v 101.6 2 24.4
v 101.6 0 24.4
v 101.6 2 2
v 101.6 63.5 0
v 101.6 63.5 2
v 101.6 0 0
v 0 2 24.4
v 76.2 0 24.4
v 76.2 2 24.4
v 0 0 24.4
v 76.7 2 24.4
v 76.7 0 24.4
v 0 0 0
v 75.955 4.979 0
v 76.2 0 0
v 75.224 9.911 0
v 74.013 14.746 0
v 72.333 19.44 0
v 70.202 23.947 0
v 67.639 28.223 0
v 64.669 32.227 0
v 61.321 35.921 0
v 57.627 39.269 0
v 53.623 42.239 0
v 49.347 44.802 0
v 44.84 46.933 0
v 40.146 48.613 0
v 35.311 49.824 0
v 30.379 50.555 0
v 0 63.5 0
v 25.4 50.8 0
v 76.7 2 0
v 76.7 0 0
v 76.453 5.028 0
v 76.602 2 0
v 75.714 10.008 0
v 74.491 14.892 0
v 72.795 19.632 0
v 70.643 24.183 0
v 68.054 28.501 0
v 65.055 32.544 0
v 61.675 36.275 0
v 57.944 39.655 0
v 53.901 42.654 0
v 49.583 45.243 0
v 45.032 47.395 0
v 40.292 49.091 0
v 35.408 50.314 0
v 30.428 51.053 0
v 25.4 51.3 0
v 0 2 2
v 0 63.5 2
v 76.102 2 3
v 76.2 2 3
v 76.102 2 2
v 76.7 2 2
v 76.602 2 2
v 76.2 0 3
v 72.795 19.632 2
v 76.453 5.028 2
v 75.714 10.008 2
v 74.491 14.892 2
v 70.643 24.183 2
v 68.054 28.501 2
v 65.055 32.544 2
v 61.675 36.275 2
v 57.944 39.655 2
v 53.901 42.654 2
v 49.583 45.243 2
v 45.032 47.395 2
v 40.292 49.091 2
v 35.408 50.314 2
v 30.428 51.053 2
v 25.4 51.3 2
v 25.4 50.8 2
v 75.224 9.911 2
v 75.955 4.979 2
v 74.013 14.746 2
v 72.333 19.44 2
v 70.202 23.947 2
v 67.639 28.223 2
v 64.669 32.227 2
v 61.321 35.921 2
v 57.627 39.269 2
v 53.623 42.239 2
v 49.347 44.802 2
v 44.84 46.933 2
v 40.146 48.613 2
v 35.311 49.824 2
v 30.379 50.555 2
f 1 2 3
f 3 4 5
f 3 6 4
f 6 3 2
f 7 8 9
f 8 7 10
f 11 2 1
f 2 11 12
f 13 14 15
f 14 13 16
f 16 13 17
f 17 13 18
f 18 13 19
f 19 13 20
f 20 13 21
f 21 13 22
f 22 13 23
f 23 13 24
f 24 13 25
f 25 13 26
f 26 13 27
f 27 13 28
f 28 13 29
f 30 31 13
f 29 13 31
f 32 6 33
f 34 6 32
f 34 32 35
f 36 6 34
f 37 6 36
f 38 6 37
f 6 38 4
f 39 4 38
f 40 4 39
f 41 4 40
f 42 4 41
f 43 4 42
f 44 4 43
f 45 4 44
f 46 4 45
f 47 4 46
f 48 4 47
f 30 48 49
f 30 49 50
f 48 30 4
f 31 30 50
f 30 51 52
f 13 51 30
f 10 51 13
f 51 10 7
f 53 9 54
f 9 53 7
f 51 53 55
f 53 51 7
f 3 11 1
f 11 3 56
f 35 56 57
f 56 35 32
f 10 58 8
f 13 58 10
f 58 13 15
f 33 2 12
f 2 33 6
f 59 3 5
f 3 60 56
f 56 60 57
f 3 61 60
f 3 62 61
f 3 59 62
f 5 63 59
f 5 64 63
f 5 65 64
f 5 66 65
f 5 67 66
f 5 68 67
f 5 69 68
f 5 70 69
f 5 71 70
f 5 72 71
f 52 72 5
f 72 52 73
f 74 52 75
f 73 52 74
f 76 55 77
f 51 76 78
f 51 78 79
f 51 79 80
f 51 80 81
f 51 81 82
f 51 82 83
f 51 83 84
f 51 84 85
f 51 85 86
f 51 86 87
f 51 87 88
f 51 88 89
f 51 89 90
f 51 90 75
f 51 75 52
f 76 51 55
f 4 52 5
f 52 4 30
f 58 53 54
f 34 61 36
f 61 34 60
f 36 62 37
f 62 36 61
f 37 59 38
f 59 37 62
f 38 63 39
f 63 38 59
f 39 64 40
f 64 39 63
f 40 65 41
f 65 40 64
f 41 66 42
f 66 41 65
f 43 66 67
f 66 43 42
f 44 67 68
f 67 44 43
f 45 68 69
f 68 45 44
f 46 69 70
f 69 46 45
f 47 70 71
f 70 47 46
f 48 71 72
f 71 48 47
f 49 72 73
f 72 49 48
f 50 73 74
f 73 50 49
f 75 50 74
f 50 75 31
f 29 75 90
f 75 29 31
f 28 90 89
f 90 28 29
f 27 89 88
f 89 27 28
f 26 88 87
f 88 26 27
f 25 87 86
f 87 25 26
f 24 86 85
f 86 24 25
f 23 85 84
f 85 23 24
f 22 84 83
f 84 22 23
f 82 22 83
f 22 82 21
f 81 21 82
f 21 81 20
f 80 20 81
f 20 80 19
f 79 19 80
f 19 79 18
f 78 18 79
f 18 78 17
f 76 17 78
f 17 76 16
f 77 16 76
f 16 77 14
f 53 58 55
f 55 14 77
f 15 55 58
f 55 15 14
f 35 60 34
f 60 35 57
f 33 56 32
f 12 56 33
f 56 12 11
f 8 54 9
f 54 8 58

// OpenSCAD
// file: constants.scad
inchRatio = 25.4;
nozzelThickness = 0.4;
subUnitSide = 6 * inchRatio;


unitHeight = 1 * inchRatio;
// stepHeight = unitHeight / 12;
stepHeight = unitHeight / 11;
stepTred = (2 * unitHeight) / 11;

$fn = $preview ? 32 : 64;


capHeight = 2 * stepHeight;
capWidth = 4 * nozzelThickness;
taperHeight = .75;
taperWidth = stepTred;

default_wall = 2;
// file: libs/arc.scad
// Source
// https://www.thingiverse.com/thing:1092611/#files

module arc(radius, thickness, angle, fragments){
  $fn=fragments;
	intersection(){
		union(){
			rights = floor(angle/90);
			remain = angle-rights*90;
			if(angle > 90){
				for(i = [0:rights-1]){
					rotate(i*90-(rights-1)*90/2){
						polygon([[0, 0], [radius+thickness, (radius+thickness)*tan(90/2)], [radius+thickness, -(radius+thickness)*tan(90/2)]]);
					}
				}
				rotate(-(rights)*90/2)
					polygon([[0, 0], [radius+thickness, 0], [radius+thickness, -(radius+thickness)*tan(remain/2)]]);
				rotate((rights)*90/2)
					polygon([[0, 0], [radius+thickness, (radius+thickness)*tan(remain/2)], [radius+thickness, 0]]);
			}else{
				polygon([[0, 0], [radius+thickness, (radius+thickness)*tan(angle/2)], [radius+thickness, -(radius+thickness)*tan(angle/2)]]);
			}
		}
		difference(){
			circle(radius+thickness);
			circle(radius);
		}
	}
}
// main file
use <libs/arc.scad>;
include <constants.scad>;

// arcJig();
arcJig(2 * inchRatio);

module arcJig(radius = inchRatio) {

    jigThickness = 2;
    wireChannel = 0.5;
    negativeThickness = 4;

    jigLength = radius  + 2 * inchRatio;
    jigWidth = radius* 1.25;
    foamDepth = 1 * inchRatio - 1;

    difference() {
    union() {
    cube([jigLength, jigThickness, foamDepth]); // z
    cube([jigLength, jigWidth ,jigThickness]);  // x
    }


    translate([inchRatio,0, -1])  {
    #linear_extrude(height = negativeThickness) 
    rotate(45) 
    arc (
        radius = radius,
        thickness = wireChannel,
        angle = 90,
        fragments = 64
    );

    translate([radius, -1,0]) 
    cube([wireChannel,negativeThickness-1, inchRatio + 2]);
    };
    }
        
}
